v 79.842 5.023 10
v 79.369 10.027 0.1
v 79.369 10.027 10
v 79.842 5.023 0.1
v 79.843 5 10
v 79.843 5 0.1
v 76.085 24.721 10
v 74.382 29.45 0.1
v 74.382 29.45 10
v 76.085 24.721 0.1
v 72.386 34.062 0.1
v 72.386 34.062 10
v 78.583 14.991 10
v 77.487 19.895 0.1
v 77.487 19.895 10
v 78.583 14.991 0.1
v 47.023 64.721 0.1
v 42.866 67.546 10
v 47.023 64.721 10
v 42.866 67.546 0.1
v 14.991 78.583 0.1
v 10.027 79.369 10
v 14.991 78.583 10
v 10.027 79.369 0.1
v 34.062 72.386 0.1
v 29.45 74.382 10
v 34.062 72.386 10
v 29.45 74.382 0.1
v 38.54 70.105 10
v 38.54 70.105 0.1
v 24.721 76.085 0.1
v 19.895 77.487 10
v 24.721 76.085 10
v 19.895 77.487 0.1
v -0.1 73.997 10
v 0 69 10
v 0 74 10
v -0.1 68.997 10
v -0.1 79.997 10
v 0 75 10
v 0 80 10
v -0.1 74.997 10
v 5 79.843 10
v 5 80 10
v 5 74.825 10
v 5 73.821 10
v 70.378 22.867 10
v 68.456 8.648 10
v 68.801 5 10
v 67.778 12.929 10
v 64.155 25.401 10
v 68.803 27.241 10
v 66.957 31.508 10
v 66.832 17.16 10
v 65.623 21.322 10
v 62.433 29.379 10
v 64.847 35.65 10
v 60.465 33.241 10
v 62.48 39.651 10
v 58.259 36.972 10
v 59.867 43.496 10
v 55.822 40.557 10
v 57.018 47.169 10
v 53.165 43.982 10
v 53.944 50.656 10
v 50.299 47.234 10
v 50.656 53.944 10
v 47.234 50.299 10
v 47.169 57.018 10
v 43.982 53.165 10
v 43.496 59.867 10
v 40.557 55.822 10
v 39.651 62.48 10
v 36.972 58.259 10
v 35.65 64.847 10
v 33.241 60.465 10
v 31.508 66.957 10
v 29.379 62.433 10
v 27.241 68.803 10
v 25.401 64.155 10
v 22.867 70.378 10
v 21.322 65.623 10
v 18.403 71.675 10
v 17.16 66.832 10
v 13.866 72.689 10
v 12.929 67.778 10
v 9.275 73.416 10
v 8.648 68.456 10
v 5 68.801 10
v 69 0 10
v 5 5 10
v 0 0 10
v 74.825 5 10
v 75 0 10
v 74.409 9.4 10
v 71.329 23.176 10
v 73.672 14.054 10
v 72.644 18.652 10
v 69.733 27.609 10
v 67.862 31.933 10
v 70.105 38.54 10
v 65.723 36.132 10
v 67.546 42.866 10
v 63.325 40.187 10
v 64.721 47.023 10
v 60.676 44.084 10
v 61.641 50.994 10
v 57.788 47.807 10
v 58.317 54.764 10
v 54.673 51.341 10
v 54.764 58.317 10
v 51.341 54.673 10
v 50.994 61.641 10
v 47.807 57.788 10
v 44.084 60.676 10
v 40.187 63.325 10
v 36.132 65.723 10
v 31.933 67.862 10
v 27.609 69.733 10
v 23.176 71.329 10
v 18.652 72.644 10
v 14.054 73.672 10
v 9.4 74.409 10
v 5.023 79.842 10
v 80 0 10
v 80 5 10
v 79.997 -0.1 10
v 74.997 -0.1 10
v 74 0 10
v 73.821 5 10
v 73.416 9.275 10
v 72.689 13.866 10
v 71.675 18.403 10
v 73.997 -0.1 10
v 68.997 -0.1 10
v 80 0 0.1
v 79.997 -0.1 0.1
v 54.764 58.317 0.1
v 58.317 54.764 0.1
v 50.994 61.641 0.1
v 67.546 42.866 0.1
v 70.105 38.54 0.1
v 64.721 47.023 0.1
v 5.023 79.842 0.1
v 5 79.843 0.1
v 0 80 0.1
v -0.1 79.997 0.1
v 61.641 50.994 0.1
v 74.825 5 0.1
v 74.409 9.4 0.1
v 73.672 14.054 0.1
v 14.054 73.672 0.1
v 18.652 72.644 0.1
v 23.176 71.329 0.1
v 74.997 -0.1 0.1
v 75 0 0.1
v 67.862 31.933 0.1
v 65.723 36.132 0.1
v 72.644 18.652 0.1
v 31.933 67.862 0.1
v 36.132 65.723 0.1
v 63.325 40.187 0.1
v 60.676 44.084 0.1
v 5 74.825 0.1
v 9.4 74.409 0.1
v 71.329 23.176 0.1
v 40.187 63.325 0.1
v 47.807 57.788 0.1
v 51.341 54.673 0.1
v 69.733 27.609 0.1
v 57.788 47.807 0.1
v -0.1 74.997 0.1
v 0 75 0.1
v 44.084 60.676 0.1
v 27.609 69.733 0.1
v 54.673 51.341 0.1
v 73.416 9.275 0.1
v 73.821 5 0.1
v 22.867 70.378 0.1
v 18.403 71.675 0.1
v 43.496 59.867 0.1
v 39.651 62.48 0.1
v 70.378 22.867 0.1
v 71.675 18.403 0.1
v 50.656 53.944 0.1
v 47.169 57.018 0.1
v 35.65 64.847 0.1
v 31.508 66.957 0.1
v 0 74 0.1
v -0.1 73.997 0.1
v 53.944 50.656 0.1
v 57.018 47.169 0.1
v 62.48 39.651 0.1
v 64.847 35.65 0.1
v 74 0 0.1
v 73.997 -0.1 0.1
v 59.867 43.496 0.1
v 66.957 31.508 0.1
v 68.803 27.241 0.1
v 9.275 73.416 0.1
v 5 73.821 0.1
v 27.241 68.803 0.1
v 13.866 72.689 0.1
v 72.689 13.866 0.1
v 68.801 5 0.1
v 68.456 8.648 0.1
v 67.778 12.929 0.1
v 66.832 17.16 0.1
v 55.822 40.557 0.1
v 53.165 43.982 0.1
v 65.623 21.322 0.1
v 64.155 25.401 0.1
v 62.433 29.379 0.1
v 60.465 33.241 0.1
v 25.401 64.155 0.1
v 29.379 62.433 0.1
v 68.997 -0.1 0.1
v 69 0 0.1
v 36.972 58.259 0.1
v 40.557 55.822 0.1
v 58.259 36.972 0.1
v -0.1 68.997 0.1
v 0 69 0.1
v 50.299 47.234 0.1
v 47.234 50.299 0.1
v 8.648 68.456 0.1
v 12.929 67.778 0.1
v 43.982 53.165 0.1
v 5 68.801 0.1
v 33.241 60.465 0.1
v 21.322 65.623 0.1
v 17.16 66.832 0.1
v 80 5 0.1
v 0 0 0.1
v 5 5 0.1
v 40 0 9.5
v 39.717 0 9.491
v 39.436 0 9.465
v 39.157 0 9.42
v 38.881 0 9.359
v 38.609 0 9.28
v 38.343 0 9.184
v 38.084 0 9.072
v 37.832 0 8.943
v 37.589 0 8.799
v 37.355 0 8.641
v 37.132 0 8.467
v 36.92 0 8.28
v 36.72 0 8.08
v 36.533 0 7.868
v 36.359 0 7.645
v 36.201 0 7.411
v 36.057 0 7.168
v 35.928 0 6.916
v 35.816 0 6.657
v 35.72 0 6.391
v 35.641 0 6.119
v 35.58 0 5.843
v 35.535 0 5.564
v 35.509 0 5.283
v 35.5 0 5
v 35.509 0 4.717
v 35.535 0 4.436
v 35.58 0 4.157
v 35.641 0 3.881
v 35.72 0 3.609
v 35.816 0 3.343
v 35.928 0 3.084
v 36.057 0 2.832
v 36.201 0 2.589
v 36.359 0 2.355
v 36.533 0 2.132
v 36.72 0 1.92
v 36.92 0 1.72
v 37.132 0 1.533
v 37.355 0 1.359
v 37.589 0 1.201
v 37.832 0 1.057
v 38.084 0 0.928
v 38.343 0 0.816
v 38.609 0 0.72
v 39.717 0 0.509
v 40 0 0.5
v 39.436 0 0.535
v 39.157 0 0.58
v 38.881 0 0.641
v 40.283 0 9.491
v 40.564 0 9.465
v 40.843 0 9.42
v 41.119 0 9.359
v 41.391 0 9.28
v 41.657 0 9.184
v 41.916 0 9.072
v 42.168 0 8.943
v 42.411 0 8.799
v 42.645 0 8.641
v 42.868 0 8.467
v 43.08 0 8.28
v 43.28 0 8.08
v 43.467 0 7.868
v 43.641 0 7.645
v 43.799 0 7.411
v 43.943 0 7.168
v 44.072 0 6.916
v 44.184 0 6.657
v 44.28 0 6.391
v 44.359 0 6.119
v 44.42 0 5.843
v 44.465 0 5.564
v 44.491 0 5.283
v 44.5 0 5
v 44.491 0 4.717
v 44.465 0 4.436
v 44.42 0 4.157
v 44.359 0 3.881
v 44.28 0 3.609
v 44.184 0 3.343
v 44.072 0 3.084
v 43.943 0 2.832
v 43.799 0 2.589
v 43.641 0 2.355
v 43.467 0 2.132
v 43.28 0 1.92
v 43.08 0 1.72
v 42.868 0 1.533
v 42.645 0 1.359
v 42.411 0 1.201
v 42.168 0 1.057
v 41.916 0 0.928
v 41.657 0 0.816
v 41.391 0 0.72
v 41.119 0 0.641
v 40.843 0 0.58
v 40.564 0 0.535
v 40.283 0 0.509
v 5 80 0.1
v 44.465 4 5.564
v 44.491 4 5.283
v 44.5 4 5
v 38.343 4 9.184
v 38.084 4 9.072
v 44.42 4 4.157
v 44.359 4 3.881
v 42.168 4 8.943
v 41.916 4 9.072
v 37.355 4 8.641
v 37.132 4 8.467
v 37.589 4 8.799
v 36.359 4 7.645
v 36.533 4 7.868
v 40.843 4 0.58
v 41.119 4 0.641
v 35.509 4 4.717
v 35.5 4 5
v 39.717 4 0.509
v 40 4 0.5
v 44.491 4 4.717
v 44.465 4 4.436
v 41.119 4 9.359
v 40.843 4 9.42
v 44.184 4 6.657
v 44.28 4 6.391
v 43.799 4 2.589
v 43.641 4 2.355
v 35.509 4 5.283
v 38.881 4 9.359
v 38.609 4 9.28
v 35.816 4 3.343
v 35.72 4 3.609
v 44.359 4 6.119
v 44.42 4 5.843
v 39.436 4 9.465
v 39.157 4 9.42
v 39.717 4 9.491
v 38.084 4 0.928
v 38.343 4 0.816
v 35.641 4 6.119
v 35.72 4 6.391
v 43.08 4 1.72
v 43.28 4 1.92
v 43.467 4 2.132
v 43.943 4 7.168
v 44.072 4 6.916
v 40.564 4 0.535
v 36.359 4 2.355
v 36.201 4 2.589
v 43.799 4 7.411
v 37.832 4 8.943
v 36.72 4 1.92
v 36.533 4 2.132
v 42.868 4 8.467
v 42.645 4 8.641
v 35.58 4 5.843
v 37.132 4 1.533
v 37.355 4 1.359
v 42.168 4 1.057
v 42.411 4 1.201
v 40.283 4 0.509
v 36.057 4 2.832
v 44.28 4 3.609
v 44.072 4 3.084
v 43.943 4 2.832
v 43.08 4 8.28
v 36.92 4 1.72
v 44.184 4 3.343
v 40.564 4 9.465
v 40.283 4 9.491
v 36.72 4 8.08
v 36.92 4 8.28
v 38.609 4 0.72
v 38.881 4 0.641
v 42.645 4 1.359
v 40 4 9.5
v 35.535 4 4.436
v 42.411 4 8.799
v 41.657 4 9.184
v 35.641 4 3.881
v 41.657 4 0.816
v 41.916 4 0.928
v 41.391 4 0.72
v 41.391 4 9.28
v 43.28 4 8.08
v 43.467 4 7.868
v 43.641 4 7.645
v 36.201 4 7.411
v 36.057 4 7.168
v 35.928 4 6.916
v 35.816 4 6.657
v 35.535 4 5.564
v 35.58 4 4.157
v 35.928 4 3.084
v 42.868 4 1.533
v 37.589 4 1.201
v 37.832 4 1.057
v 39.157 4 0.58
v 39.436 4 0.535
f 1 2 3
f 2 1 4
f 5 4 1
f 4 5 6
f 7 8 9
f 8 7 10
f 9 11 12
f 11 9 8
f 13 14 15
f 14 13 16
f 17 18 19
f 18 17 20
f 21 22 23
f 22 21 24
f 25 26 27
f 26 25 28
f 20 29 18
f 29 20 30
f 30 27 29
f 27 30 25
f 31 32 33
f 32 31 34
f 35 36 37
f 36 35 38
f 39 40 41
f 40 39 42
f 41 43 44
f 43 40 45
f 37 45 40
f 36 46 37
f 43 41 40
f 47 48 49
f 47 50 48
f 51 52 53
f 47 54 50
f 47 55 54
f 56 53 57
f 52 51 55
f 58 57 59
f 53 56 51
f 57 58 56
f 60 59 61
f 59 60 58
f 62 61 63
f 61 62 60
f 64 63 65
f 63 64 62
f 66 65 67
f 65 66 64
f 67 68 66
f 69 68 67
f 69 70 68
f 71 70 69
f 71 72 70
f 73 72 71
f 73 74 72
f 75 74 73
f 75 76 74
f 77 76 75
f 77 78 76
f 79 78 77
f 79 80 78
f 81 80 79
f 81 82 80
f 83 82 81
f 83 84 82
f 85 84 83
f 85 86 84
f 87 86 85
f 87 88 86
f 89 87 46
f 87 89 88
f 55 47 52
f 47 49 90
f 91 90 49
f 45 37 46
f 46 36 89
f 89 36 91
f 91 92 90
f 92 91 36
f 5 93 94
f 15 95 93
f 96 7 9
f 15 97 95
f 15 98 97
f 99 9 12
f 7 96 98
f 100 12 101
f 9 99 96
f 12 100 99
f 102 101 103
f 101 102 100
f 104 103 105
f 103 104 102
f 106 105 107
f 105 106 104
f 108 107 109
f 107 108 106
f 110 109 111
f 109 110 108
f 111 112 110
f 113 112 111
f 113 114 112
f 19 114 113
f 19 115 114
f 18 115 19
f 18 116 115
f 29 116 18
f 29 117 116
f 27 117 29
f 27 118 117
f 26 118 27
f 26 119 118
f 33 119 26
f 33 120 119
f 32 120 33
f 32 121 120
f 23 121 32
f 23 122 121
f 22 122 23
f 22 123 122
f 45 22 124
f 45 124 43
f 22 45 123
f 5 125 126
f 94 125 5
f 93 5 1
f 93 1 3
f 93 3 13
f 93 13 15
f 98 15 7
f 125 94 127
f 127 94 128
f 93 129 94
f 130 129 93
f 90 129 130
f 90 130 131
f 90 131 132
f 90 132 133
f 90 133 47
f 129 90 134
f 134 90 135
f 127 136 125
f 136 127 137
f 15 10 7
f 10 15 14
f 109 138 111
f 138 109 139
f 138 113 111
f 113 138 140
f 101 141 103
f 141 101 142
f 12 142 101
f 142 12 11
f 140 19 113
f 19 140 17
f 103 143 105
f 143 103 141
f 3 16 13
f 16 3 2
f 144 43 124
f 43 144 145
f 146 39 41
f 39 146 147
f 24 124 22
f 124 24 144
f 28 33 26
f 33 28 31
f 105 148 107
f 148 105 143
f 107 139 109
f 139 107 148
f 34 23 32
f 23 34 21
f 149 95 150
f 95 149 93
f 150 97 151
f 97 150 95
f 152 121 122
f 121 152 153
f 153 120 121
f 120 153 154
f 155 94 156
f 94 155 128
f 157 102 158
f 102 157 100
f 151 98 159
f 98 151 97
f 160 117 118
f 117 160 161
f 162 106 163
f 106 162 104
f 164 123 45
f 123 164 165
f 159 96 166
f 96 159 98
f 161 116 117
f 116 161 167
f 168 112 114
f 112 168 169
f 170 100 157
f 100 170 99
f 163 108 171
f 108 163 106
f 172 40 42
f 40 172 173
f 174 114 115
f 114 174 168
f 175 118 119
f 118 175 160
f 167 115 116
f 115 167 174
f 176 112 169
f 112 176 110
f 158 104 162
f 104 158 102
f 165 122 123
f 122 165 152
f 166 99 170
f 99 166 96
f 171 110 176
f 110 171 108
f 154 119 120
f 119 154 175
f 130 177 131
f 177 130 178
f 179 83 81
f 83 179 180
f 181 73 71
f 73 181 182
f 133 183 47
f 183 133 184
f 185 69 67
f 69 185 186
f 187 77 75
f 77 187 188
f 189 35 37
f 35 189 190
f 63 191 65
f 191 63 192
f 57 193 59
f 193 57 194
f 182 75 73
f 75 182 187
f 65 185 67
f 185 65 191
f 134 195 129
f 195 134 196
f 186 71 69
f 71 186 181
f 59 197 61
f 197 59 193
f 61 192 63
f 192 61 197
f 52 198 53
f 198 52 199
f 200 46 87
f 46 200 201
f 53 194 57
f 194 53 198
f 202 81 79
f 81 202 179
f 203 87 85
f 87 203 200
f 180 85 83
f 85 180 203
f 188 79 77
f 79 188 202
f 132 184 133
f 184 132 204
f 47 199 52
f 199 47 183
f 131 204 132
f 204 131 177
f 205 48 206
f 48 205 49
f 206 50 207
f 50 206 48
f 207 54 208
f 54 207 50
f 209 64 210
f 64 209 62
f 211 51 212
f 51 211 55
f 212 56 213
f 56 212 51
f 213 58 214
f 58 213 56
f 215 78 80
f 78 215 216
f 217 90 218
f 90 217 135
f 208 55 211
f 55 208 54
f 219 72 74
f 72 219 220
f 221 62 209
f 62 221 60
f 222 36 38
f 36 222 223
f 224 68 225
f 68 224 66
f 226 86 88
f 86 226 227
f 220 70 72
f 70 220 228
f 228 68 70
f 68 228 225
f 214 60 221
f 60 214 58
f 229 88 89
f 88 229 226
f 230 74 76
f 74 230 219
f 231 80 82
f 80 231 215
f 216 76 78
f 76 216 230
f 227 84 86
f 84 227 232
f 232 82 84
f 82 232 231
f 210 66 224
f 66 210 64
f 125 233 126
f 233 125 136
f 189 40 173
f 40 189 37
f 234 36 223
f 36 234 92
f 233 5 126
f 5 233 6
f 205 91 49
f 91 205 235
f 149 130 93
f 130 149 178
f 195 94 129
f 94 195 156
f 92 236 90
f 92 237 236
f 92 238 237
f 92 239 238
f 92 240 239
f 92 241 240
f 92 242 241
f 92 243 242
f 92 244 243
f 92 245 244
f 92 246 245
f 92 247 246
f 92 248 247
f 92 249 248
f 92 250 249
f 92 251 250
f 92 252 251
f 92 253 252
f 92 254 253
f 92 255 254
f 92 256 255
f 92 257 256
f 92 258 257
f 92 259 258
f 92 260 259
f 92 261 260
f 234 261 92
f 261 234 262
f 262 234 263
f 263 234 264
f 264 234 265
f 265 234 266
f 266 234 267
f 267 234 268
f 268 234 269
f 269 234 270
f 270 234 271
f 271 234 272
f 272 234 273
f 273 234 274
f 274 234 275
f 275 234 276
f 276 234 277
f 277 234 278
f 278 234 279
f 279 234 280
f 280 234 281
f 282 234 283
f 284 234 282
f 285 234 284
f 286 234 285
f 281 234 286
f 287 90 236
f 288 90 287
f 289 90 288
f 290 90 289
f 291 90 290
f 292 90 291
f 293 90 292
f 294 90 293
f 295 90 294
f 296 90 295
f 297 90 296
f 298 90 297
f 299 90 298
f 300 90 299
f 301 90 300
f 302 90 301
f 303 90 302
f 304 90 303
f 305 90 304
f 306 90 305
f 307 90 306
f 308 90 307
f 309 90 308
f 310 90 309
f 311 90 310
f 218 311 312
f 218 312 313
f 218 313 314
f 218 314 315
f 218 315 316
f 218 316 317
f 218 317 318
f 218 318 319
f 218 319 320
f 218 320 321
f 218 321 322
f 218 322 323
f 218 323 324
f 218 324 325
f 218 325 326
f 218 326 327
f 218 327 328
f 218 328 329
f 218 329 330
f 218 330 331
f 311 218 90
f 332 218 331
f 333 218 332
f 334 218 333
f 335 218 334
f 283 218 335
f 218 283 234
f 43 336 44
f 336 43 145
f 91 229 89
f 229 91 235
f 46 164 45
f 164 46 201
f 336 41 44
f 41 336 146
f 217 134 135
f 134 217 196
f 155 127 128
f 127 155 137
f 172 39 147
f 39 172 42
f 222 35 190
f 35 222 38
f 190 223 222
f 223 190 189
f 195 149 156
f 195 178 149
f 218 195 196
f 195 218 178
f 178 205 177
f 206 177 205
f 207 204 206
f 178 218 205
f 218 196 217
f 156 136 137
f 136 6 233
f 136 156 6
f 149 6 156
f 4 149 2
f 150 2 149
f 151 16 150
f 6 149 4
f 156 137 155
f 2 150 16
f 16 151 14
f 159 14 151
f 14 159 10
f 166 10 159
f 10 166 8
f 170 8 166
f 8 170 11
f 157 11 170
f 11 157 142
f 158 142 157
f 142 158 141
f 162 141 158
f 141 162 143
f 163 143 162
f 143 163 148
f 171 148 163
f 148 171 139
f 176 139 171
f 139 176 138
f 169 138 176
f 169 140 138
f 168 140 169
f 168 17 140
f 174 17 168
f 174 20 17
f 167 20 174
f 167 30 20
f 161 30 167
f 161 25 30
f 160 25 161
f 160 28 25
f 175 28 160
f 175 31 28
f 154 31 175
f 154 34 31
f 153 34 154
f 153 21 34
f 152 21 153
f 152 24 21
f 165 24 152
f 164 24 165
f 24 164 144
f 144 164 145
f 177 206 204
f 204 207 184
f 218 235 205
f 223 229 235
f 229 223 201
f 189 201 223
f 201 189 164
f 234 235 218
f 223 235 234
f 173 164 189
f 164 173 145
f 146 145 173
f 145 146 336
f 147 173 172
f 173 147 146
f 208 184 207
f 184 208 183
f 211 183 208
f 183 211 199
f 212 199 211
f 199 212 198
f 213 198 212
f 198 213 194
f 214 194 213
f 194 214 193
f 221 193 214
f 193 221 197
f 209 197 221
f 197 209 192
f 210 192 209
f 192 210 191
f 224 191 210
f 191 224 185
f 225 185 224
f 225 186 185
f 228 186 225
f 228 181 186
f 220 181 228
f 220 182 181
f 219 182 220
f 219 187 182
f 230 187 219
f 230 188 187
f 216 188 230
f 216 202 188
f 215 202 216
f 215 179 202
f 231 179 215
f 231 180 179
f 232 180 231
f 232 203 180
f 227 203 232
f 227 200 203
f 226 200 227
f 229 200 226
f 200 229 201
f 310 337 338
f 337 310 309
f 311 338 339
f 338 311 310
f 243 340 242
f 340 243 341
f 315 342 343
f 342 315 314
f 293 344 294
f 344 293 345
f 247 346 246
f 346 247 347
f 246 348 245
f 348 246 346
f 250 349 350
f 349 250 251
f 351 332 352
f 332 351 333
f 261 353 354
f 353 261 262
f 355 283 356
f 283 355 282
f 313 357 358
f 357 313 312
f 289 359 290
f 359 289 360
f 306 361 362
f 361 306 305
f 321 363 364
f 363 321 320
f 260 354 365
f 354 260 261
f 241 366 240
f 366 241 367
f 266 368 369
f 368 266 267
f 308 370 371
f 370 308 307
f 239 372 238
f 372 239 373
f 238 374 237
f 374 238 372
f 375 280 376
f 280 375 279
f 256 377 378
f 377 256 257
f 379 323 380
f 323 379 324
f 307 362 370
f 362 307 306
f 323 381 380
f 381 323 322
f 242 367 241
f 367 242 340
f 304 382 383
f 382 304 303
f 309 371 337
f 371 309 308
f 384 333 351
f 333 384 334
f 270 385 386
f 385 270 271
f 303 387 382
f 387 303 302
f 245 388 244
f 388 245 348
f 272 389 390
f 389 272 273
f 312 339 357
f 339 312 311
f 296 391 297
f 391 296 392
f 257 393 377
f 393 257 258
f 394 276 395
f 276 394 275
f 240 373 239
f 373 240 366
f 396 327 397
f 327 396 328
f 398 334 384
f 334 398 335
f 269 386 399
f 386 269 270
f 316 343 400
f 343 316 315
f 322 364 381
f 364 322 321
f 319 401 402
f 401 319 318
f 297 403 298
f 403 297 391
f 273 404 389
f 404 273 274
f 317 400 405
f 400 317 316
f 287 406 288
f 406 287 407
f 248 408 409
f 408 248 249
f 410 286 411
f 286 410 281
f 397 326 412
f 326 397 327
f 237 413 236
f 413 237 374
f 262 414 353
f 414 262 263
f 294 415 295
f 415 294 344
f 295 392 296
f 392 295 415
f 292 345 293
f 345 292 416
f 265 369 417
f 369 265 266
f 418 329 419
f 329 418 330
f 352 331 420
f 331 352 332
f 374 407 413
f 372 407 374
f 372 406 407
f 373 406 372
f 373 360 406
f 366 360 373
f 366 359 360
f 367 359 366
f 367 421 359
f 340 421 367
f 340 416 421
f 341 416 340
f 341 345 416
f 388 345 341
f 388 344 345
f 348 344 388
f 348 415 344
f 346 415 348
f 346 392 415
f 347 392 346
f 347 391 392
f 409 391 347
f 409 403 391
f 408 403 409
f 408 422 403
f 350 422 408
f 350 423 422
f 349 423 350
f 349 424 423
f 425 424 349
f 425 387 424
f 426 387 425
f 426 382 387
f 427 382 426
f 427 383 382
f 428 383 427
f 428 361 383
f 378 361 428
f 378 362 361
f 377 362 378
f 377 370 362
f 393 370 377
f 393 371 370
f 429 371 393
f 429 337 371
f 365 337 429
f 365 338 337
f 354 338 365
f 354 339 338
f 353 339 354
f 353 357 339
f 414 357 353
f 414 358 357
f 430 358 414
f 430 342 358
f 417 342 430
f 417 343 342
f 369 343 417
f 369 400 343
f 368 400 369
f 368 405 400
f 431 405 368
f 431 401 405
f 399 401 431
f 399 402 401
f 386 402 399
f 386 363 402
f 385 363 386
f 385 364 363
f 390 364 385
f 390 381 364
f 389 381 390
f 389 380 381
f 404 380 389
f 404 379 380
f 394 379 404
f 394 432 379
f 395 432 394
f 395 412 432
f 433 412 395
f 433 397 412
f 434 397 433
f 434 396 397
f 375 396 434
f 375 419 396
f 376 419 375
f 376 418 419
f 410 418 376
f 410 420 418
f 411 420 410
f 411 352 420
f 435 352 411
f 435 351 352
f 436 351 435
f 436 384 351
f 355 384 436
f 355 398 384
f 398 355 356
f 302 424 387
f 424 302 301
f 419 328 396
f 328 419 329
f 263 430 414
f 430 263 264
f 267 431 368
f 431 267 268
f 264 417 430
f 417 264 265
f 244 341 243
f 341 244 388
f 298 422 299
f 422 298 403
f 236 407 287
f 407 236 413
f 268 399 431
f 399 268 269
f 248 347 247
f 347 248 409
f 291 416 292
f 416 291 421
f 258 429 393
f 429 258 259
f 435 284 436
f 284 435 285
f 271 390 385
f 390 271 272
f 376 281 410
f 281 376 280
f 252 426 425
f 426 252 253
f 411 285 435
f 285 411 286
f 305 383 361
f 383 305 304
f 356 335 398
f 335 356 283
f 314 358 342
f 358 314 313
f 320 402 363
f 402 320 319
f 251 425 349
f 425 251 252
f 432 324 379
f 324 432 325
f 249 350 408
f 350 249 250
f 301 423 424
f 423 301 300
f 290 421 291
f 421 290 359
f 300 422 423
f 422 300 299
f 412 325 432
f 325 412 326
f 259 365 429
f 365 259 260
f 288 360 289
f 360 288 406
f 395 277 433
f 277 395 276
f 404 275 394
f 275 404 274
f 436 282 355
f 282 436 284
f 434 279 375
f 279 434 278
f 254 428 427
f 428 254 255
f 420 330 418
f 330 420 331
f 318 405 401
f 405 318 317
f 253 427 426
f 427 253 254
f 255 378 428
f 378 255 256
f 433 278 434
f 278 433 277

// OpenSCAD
a=80; //radius
b=10; //thickness
s=5;
t=1;
x=4.5; //rad of magnet
y=5;//height of mag
z=8;

$fn=100;
difference(){
difference(){
union(){
cube([a,s,b]);
rotate([0,0,90])translate([0,-s,0])cube([a,s,b]);
//outet ring
difference(){
cylinder(r=a, h=b);
cylinder(r=a-s, h=b+1);
}
//inner ring
difference(){
cylinder(r=a-s-t, h=b);
cylinder(r=a-s-t-s, h=b+1);
}
}
// cut 3/4 of cylinder
translate([0,-a-.1,-.5])cube([a,a,b+1]);
translate([-a,-a,-.5])cube([a,a,b+1]);
translate([-a-.1,0,-.5])cube([a,a,b+1]);
translate([0,0,-9.9])cylinder(r=a+1, h=10);
}
translate([a/2,s-1,b/2])rotate([90,0,0])cylinder(r=x, h=y);
}
